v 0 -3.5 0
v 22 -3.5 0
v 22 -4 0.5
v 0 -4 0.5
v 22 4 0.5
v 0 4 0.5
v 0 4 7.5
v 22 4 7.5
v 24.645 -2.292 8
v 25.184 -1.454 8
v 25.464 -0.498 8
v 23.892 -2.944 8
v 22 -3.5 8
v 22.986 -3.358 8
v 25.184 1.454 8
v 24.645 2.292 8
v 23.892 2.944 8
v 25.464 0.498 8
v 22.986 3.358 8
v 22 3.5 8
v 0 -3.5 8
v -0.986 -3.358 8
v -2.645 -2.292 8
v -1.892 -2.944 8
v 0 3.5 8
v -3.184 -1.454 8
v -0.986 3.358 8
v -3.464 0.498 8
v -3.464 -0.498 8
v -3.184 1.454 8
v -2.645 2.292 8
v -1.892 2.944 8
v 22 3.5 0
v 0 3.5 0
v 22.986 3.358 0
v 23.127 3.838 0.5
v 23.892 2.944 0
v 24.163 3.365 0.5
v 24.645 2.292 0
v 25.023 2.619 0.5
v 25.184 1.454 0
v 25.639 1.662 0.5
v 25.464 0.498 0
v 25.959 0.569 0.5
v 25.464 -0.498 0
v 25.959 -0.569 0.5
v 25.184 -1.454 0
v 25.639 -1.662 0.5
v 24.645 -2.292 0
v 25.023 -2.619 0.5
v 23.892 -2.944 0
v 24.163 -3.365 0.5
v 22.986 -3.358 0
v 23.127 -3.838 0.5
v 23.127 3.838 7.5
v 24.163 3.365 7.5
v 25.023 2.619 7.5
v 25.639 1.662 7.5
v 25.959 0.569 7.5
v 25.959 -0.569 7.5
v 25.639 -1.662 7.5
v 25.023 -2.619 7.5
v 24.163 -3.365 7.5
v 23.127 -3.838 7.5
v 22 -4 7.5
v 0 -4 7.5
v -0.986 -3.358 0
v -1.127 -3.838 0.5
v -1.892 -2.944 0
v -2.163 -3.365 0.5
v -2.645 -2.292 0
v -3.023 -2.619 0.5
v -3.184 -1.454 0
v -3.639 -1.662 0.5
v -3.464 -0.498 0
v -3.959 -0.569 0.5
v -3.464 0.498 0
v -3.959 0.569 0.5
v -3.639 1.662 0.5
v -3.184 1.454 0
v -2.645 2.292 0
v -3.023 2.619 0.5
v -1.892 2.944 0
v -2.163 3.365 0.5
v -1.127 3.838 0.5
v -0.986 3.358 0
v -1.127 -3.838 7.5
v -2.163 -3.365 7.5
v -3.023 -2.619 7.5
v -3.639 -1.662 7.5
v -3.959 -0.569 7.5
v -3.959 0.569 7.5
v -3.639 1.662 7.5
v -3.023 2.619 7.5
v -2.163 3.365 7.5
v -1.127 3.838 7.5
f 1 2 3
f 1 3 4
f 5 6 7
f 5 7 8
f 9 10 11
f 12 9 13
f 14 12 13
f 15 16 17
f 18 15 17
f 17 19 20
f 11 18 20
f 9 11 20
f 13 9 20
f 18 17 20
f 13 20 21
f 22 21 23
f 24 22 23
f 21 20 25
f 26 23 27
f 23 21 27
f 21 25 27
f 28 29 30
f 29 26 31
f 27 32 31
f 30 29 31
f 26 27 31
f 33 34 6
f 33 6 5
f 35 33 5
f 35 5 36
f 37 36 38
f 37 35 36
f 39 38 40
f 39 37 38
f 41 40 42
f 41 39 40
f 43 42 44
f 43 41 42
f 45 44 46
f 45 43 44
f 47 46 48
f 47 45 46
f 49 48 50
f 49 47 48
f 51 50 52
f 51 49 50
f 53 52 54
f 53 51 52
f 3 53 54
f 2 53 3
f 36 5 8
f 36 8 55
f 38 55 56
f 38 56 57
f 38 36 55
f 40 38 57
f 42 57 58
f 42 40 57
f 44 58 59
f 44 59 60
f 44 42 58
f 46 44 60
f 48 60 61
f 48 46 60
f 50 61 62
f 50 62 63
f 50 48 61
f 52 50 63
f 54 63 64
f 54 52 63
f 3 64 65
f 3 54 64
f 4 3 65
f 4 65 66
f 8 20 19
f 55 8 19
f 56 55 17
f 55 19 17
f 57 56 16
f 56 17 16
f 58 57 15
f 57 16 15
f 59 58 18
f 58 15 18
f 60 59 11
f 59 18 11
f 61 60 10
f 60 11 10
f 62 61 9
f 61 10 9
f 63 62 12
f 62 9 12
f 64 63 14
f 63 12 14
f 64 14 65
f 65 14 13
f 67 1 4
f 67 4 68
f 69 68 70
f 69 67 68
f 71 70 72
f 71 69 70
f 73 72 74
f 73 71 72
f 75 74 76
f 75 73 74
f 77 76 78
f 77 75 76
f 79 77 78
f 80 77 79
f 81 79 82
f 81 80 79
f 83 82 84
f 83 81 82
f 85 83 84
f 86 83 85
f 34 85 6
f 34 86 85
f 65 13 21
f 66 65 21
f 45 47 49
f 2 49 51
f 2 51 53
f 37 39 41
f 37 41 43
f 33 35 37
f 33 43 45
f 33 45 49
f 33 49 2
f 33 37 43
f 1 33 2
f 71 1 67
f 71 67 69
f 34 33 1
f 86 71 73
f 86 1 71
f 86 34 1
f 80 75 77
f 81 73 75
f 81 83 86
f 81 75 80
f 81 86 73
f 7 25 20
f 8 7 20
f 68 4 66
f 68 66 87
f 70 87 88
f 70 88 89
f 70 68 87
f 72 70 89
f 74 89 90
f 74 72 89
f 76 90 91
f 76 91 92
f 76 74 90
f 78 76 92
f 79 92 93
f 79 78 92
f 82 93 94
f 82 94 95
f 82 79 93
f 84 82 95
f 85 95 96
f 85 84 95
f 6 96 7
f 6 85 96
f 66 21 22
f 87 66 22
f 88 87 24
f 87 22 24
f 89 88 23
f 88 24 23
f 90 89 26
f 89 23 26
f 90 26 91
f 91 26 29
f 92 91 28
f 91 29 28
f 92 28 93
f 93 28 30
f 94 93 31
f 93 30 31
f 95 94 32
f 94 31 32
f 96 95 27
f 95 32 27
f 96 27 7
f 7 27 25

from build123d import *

# Parameters (mm, degrees)
P_IDAT_VYSUNUT_M1_DEPTH = 8
ZKOSEN_1_SIZE           = 0.5


with BuildPart() as part:
    # Skica1 → Přidat vysunutím1 (new body)
    with BuildSketch(Plane.XY):
        with BuildLine():
            Line((0, 4), (22, 4))
            ThreePointArc((22, 4), (26, 0), (22, -4))
            Line((22, -4), (0, -4))
            ThreePointArc((0, -4), (-4, 0), (0, 4))
        make_face()
    extrude(amount=P_IDAT_VYSUNUT_M1_DEPTH)

    # Zkosení1
    zkosen_1_edges = [part.edges().sort_by_distance(p)[0] for p in [
        (26, 0, 8),
        (11, 4, 8),
        (-4, 0, 8),
        (11, 4, 0),
        (26, 0, 0),
        (11, -4, 0),
        (-4, 0, 0),
        (11, -4, 8),
    ]]
    chamfer(zkosen_1_edges, length=ZKOSEN_1_SIZE)


solid = part.part
